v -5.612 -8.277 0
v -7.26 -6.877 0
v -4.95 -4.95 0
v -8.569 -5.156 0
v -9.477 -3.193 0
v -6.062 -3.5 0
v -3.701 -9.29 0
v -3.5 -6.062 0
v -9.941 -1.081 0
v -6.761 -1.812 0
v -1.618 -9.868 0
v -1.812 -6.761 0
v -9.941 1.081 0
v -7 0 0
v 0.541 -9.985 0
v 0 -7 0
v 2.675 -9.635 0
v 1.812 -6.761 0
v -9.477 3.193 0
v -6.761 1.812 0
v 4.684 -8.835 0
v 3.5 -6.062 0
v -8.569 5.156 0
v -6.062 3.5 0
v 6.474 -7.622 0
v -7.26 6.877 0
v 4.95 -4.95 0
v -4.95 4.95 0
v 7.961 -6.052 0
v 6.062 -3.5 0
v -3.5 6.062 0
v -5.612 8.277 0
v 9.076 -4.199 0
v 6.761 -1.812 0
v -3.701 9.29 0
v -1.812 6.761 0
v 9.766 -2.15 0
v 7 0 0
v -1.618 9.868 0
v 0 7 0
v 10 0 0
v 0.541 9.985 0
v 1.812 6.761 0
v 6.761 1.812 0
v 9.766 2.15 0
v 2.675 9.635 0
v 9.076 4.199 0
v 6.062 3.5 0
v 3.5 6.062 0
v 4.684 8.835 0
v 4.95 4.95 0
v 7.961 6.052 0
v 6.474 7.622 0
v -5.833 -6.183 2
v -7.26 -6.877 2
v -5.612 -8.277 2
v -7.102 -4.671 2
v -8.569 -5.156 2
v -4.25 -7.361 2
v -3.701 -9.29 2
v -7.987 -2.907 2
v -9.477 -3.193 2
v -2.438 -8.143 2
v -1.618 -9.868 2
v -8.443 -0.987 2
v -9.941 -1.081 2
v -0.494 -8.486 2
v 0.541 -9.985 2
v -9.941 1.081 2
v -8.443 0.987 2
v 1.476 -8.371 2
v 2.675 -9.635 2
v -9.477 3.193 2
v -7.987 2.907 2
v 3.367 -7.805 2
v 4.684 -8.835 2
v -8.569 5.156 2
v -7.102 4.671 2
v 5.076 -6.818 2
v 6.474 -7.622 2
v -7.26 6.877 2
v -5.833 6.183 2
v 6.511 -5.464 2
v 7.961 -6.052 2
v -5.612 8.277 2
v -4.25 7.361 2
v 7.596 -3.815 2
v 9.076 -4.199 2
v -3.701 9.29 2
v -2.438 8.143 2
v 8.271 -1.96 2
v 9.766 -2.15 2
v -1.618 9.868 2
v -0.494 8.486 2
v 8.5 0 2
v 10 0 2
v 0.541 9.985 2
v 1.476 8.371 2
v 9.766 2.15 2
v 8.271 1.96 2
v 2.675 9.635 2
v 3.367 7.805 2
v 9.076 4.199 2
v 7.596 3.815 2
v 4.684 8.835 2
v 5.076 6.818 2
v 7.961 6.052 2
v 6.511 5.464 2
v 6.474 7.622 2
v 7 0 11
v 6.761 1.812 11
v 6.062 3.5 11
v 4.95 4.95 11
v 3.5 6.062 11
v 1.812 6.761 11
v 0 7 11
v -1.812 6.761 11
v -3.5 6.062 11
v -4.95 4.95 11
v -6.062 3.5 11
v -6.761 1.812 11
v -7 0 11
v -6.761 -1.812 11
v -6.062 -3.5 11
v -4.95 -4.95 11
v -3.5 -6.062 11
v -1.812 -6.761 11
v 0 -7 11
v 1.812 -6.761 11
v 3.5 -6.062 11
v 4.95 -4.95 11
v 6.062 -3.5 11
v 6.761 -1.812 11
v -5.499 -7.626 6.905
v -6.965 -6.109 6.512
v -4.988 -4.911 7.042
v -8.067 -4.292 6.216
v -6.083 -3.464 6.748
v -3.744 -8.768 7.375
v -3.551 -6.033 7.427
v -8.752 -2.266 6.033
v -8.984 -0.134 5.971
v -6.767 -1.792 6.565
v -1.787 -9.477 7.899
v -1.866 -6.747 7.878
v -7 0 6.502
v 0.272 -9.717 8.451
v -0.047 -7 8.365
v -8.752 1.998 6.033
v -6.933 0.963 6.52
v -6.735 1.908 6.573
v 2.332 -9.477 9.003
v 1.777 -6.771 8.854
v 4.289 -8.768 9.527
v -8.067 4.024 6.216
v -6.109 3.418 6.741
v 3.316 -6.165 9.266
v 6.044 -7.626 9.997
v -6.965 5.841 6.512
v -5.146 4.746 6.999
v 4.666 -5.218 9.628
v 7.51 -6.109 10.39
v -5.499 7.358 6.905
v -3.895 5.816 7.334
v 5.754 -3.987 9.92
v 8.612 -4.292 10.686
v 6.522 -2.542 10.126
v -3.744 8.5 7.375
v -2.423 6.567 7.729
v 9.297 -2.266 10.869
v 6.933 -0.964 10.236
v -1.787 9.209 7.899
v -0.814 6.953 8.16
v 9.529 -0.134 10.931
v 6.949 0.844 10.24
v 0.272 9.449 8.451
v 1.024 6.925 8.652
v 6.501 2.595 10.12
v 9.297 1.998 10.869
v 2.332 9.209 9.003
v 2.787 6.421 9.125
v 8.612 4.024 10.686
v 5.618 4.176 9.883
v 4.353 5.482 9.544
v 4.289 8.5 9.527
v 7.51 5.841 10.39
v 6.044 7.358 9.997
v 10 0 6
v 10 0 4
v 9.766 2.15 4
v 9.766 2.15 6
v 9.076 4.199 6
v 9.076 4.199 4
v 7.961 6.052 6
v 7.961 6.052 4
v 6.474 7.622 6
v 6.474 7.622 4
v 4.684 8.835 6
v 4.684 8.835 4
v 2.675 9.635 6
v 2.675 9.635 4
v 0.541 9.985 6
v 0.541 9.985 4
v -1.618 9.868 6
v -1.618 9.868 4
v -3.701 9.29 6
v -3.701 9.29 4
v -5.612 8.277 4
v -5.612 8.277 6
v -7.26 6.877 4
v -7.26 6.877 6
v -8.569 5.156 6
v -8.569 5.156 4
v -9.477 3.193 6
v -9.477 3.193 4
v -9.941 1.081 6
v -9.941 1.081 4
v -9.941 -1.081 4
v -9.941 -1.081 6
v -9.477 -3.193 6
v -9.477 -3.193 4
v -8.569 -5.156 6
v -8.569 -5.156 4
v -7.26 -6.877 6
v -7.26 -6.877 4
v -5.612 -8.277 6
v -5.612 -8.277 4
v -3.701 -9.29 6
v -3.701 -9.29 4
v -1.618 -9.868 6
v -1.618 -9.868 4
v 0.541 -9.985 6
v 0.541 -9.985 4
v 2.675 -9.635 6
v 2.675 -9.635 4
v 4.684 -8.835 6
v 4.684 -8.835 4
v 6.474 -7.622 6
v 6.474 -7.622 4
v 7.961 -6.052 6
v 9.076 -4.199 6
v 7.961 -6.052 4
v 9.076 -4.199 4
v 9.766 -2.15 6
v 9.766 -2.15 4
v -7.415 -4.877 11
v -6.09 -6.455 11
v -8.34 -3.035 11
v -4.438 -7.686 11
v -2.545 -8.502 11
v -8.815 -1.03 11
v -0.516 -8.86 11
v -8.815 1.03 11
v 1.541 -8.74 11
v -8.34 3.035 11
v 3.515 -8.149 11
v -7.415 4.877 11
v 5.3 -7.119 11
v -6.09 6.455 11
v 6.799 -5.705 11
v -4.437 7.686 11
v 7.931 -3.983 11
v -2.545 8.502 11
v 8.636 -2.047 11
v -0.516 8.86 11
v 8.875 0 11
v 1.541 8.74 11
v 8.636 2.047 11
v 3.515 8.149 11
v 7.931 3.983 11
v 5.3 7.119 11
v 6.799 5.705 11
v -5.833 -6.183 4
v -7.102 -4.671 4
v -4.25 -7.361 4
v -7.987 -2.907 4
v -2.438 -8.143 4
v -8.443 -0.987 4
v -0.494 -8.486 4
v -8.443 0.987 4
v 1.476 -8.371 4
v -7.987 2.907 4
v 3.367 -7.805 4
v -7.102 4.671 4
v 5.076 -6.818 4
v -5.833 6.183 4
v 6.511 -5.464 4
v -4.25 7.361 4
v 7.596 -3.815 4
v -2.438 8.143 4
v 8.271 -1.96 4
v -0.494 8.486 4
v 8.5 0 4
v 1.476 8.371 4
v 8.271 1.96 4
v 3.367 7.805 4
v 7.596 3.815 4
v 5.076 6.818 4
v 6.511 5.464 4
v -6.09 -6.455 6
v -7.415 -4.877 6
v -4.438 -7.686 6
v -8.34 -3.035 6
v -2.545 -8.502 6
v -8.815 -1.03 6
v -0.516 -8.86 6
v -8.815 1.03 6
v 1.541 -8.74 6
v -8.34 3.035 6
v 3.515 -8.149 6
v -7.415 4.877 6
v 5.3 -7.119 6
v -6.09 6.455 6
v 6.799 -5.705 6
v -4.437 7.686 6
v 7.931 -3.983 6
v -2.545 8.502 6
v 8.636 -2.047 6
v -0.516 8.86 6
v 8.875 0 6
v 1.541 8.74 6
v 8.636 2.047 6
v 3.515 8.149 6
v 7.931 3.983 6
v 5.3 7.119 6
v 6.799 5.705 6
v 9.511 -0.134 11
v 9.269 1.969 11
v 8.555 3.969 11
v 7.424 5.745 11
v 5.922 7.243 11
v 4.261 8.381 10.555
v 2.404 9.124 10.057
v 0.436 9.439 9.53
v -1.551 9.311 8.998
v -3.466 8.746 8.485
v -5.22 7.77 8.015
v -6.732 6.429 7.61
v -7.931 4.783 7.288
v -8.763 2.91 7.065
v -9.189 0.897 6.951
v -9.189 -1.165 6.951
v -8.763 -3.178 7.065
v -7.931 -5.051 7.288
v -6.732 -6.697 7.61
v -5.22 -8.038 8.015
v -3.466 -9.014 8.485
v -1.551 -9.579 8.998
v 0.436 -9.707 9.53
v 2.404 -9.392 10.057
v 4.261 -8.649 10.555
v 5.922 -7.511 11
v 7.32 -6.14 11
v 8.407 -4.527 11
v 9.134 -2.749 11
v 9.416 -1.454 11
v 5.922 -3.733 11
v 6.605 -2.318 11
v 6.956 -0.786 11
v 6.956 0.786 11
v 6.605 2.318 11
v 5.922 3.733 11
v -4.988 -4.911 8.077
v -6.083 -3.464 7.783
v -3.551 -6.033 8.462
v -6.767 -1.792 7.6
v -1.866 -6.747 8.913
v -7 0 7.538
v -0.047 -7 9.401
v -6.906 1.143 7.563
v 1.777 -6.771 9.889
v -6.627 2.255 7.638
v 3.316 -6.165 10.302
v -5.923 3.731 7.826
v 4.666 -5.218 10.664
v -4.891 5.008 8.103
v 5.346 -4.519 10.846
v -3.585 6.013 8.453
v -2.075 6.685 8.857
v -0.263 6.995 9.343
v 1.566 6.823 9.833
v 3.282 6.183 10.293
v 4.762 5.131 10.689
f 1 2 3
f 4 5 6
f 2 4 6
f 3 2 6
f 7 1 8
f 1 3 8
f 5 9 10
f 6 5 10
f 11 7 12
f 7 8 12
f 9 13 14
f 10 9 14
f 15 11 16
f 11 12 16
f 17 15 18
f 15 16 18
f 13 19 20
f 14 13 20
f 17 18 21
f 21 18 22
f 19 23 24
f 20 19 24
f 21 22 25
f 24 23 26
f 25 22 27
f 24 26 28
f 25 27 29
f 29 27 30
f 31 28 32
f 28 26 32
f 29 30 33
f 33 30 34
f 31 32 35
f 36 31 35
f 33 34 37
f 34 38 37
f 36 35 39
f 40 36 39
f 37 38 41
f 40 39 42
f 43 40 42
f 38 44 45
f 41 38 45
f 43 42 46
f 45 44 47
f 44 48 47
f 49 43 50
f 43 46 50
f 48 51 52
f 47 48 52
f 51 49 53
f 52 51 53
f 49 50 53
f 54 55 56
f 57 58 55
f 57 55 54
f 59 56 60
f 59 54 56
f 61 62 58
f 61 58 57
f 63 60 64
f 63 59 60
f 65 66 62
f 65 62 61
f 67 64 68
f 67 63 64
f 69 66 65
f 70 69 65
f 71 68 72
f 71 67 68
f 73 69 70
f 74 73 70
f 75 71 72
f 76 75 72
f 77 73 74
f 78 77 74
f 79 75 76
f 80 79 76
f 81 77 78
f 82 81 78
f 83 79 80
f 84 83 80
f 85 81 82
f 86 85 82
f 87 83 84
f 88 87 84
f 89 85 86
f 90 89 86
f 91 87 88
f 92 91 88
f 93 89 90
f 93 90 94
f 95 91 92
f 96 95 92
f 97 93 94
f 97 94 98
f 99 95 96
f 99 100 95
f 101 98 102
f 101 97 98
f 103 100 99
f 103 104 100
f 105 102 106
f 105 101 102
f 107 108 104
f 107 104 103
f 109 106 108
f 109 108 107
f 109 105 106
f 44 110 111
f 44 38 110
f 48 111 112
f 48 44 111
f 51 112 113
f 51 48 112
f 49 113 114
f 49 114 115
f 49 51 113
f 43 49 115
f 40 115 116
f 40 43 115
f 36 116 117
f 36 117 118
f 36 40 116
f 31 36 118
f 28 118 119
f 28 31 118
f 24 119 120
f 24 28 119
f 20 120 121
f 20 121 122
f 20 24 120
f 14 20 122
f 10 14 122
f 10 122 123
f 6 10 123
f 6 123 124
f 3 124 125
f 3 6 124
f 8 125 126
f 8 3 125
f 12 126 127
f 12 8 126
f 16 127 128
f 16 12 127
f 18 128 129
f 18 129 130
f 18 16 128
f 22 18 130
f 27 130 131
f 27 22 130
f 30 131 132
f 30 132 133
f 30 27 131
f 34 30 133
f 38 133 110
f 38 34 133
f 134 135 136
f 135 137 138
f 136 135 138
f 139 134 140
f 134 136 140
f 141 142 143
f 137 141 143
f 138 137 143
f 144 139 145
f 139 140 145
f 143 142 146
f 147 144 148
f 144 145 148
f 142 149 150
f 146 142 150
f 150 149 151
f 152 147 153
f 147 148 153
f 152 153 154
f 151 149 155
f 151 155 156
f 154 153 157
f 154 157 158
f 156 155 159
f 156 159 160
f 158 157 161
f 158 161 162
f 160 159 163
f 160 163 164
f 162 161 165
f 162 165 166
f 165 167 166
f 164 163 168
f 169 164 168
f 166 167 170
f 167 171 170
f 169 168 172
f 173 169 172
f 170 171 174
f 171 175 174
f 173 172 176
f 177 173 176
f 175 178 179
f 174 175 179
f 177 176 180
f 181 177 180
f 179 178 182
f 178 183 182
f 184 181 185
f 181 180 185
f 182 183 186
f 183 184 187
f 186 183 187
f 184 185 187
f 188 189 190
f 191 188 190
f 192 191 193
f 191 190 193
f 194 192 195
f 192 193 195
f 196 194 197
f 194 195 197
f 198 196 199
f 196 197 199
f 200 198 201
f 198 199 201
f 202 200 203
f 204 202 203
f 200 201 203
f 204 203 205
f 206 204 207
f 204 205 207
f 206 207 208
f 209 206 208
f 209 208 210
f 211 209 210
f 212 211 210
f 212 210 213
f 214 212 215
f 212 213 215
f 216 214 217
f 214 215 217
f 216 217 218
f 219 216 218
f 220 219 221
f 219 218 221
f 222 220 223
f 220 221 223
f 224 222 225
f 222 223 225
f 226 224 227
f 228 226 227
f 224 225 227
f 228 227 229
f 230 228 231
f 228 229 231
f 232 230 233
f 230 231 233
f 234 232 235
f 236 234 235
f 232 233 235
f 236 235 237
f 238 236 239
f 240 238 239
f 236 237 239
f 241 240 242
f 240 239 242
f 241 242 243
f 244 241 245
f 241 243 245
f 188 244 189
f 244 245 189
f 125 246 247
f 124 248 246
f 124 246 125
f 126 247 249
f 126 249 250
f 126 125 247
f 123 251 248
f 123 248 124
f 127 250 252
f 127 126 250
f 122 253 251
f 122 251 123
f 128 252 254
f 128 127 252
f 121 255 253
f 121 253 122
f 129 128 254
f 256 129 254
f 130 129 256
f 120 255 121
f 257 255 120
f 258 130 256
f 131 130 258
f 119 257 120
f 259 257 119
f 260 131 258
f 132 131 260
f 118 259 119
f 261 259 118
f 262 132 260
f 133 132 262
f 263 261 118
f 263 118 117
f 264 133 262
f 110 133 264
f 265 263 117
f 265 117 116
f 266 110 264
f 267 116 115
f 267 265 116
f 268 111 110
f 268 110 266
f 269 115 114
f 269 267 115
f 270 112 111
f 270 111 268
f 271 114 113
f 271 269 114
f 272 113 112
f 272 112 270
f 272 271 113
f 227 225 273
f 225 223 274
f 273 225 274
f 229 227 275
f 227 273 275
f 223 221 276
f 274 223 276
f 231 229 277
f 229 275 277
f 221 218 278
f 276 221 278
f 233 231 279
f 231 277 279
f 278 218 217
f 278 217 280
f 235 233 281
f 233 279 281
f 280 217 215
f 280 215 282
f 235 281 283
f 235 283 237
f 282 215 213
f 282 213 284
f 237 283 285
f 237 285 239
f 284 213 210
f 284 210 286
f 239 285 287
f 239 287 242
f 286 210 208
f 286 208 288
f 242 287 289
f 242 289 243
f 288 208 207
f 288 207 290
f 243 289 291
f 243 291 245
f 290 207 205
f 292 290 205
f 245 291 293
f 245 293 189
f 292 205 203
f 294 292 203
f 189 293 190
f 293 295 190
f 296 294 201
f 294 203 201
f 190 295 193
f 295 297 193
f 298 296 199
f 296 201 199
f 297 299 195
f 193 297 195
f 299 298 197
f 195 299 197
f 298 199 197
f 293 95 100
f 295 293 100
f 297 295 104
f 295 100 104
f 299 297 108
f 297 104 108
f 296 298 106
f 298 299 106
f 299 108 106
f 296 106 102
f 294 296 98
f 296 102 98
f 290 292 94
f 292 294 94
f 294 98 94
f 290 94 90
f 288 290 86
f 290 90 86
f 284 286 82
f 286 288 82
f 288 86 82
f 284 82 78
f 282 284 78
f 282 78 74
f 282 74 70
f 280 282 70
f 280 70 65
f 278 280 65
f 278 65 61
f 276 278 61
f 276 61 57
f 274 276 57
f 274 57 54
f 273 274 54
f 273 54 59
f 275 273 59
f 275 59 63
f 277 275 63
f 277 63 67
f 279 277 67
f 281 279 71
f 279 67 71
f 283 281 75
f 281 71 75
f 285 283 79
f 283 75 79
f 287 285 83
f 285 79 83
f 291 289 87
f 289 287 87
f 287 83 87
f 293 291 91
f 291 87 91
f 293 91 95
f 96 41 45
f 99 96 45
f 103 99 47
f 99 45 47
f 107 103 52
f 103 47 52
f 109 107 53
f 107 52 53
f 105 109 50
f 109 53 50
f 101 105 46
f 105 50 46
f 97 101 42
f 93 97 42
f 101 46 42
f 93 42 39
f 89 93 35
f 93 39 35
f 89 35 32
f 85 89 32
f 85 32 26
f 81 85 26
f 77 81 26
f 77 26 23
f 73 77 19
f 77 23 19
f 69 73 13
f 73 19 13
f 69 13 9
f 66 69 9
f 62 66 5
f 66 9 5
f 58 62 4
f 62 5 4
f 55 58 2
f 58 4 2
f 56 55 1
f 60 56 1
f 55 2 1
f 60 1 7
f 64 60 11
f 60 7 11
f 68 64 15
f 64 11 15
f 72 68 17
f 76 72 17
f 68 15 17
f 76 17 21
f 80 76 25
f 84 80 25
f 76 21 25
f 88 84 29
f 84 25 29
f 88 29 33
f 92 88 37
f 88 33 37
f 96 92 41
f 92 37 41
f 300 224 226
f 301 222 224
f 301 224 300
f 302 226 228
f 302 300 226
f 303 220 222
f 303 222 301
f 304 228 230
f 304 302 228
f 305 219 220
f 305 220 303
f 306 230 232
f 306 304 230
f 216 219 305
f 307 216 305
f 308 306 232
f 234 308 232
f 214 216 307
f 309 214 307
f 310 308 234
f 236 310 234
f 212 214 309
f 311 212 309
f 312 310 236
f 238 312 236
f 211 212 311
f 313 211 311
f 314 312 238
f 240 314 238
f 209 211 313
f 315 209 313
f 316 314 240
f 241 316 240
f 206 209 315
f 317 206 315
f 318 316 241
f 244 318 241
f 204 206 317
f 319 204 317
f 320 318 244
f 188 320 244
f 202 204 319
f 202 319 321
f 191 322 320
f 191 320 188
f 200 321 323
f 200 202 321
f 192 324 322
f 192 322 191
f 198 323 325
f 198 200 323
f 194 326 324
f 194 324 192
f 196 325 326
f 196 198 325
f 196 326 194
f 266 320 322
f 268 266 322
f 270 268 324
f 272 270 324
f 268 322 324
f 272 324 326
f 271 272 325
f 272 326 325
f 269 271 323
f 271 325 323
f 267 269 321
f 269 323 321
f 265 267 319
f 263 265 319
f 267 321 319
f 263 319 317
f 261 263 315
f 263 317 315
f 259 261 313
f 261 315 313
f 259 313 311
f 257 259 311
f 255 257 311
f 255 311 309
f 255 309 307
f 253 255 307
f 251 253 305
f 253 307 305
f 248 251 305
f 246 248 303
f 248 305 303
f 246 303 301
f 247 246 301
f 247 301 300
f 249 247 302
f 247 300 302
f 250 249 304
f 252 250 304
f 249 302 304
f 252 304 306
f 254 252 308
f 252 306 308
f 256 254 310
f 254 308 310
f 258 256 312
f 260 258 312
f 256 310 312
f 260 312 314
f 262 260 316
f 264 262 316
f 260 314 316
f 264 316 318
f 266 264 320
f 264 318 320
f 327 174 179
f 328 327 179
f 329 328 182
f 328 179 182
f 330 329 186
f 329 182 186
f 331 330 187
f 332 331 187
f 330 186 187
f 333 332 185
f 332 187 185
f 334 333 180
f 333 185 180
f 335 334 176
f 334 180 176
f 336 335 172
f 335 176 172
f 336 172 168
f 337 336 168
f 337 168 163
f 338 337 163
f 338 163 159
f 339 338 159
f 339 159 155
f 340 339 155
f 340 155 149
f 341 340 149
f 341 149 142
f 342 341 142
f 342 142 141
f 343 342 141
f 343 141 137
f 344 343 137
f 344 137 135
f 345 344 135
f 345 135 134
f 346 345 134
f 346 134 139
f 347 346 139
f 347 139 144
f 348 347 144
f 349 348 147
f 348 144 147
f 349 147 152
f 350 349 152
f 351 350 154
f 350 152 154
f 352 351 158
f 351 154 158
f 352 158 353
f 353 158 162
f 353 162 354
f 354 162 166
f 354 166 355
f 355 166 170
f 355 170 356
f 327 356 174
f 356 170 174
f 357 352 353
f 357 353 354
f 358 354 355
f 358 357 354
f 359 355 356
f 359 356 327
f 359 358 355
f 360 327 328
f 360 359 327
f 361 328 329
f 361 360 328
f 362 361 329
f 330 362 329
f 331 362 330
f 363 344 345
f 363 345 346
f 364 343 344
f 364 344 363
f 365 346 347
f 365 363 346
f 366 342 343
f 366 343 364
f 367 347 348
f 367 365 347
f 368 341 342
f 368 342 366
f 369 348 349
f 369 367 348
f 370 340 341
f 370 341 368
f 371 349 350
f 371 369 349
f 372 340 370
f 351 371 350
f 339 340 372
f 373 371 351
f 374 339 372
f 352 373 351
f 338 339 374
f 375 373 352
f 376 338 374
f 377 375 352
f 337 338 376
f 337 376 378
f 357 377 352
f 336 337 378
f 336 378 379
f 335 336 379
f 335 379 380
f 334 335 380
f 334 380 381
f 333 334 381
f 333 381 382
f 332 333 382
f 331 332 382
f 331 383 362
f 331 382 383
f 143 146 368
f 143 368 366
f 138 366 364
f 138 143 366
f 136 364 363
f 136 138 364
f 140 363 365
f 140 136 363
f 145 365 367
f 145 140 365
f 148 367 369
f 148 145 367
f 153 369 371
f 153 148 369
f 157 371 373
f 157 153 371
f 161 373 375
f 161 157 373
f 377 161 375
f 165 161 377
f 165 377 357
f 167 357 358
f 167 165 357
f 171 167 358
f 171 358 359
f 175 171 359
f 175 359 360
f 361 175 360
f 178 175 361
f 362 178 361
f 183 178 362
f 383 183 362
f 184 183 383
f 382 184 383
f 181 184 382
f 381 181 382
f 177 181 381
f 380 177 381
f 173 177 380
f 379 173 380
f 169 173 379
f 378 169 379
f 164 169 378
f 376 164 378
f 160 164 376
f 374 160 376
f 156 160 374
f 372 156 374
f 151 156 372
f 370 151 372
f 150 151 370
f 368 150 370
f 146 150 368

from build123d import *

# Parameters (mm, degrees)
SKETCH1_R           = 10
BOSS_EXTRUDE1_DEPTH = 2
SKETCH2_R           = 8.5
BOSS_EXTRUDE2_DEPTH = 6
BOSS_EXTRUDE3_START = 4
SKETCH3_R           = 10
BOSS_EXTRUDE3_DEPTH = 2
SKETCH5_R           = 7
CUT_EXTRUDE2_DEPTH  = 16.362291496
BOSS_EXTRUDE4_START = 6
SKETCH6_R           = 8.875
SKETCH6_R_2         = 7
BOSS_EXTRUDE4_DEPTH = 5
SKETCH8_R           = 9.583059544
BOSS_EXTRUDE5_DEPTH = 1
SKETCH10_R          = 7
CUT_EXTRUDE4_DEPTH  = 19.480929695
SKETCH12_W          = 0.915114883
SKETCH12_H          = 17.75
CUT_EXTRUDE5_DEPTH  = 10


with BuildPart() as part:
    # Sketch1 → Boss-Extrude1 (new body)
    with BuildSketch(Plane.XY):
        Circle(SKETCH1_R)
    extrude(amount=BOSS_EXTRUDE1_DEPTH)

    # Sketch2 → Boss-Extrude2 (add)
    with BuildSketch(Plane.XY):
        Circle(SKETCH2_R)
    extrude(amount=BOSS_EXTRUDE2_DEPTH)

    # Sketch3 → Boss-Extrude3 (add)
    with BuildSketch(Plane.XY.offset(BOSS_EXTRUDE3_START)):
        Circle(SKETCH3_R)
    extrude(amount=BOSS_EXTRUDE3_DEPTH)

    # Sketch5 → Cut-Extrude2 (cut, through all)
    with BuildSketch(Plane.XY):
        Circle(SKETCH5_R)
    extrude(amount=CUT_EXTRUDE2_DEPTH, mode=Mode.SUBTRACT)

    # Sketch6 → Boss-Extrude4 (add)
    with BuildSketch(Plane.XY.offset(BOSS_EXTRUDE4_START)):
        Circle(SKETCH6_R)
        Circle(SKETCH6_R_2, mode=Mode.SUBTRACT)
    extrude(amount=BOSS_EXTRUDE4_DEPTH)


with BuildPart() as body_2:
    # Sketch8 → Boss-Extrude5 (new body)
    with BuildSketch(Plane(origin=(-2.094512271, 0, 7.816826211), x_dir=(0.9659258262890681, 0, 0.25881904510252135), z_dir=(-0.25881904510252135, 0, 0.9659258262890681))):
        with Locations((2.450469787, -0.133986717)):
            Circle(SKETCH8_R)
    extrude(amount=BOSS_EXTRUDE5_DEPTH)

    # Sketch10 → Cut-Extrude4 (cut, through all)
    with BuildSketch(Plane.XY):
        with Locations(Location((0, 0, 0), (0, 0, 180))):
            Circle(SKETCH10_R)
    extrude(amount=CUT_EXTRUDE4_DEPTH, mode=Mode.SUBTRACT)

    # Sketch12 → Cut-Extrude5 (cut)
    with BuildSketch(Plane(origin=(0, 0, 0), x_dir=(0, 0, -1), z_dir=(1, 0, 0))):
        with Locations((-11.457557442, 0)):
            Rectangle(SKETCH12_W, SKETCH12_H)
    extrude(amount=CUT_EXTRUDE5_DEPTH, mode=Mode.SUBTRACT)


solid = Compound([part.part, body_2.part])
